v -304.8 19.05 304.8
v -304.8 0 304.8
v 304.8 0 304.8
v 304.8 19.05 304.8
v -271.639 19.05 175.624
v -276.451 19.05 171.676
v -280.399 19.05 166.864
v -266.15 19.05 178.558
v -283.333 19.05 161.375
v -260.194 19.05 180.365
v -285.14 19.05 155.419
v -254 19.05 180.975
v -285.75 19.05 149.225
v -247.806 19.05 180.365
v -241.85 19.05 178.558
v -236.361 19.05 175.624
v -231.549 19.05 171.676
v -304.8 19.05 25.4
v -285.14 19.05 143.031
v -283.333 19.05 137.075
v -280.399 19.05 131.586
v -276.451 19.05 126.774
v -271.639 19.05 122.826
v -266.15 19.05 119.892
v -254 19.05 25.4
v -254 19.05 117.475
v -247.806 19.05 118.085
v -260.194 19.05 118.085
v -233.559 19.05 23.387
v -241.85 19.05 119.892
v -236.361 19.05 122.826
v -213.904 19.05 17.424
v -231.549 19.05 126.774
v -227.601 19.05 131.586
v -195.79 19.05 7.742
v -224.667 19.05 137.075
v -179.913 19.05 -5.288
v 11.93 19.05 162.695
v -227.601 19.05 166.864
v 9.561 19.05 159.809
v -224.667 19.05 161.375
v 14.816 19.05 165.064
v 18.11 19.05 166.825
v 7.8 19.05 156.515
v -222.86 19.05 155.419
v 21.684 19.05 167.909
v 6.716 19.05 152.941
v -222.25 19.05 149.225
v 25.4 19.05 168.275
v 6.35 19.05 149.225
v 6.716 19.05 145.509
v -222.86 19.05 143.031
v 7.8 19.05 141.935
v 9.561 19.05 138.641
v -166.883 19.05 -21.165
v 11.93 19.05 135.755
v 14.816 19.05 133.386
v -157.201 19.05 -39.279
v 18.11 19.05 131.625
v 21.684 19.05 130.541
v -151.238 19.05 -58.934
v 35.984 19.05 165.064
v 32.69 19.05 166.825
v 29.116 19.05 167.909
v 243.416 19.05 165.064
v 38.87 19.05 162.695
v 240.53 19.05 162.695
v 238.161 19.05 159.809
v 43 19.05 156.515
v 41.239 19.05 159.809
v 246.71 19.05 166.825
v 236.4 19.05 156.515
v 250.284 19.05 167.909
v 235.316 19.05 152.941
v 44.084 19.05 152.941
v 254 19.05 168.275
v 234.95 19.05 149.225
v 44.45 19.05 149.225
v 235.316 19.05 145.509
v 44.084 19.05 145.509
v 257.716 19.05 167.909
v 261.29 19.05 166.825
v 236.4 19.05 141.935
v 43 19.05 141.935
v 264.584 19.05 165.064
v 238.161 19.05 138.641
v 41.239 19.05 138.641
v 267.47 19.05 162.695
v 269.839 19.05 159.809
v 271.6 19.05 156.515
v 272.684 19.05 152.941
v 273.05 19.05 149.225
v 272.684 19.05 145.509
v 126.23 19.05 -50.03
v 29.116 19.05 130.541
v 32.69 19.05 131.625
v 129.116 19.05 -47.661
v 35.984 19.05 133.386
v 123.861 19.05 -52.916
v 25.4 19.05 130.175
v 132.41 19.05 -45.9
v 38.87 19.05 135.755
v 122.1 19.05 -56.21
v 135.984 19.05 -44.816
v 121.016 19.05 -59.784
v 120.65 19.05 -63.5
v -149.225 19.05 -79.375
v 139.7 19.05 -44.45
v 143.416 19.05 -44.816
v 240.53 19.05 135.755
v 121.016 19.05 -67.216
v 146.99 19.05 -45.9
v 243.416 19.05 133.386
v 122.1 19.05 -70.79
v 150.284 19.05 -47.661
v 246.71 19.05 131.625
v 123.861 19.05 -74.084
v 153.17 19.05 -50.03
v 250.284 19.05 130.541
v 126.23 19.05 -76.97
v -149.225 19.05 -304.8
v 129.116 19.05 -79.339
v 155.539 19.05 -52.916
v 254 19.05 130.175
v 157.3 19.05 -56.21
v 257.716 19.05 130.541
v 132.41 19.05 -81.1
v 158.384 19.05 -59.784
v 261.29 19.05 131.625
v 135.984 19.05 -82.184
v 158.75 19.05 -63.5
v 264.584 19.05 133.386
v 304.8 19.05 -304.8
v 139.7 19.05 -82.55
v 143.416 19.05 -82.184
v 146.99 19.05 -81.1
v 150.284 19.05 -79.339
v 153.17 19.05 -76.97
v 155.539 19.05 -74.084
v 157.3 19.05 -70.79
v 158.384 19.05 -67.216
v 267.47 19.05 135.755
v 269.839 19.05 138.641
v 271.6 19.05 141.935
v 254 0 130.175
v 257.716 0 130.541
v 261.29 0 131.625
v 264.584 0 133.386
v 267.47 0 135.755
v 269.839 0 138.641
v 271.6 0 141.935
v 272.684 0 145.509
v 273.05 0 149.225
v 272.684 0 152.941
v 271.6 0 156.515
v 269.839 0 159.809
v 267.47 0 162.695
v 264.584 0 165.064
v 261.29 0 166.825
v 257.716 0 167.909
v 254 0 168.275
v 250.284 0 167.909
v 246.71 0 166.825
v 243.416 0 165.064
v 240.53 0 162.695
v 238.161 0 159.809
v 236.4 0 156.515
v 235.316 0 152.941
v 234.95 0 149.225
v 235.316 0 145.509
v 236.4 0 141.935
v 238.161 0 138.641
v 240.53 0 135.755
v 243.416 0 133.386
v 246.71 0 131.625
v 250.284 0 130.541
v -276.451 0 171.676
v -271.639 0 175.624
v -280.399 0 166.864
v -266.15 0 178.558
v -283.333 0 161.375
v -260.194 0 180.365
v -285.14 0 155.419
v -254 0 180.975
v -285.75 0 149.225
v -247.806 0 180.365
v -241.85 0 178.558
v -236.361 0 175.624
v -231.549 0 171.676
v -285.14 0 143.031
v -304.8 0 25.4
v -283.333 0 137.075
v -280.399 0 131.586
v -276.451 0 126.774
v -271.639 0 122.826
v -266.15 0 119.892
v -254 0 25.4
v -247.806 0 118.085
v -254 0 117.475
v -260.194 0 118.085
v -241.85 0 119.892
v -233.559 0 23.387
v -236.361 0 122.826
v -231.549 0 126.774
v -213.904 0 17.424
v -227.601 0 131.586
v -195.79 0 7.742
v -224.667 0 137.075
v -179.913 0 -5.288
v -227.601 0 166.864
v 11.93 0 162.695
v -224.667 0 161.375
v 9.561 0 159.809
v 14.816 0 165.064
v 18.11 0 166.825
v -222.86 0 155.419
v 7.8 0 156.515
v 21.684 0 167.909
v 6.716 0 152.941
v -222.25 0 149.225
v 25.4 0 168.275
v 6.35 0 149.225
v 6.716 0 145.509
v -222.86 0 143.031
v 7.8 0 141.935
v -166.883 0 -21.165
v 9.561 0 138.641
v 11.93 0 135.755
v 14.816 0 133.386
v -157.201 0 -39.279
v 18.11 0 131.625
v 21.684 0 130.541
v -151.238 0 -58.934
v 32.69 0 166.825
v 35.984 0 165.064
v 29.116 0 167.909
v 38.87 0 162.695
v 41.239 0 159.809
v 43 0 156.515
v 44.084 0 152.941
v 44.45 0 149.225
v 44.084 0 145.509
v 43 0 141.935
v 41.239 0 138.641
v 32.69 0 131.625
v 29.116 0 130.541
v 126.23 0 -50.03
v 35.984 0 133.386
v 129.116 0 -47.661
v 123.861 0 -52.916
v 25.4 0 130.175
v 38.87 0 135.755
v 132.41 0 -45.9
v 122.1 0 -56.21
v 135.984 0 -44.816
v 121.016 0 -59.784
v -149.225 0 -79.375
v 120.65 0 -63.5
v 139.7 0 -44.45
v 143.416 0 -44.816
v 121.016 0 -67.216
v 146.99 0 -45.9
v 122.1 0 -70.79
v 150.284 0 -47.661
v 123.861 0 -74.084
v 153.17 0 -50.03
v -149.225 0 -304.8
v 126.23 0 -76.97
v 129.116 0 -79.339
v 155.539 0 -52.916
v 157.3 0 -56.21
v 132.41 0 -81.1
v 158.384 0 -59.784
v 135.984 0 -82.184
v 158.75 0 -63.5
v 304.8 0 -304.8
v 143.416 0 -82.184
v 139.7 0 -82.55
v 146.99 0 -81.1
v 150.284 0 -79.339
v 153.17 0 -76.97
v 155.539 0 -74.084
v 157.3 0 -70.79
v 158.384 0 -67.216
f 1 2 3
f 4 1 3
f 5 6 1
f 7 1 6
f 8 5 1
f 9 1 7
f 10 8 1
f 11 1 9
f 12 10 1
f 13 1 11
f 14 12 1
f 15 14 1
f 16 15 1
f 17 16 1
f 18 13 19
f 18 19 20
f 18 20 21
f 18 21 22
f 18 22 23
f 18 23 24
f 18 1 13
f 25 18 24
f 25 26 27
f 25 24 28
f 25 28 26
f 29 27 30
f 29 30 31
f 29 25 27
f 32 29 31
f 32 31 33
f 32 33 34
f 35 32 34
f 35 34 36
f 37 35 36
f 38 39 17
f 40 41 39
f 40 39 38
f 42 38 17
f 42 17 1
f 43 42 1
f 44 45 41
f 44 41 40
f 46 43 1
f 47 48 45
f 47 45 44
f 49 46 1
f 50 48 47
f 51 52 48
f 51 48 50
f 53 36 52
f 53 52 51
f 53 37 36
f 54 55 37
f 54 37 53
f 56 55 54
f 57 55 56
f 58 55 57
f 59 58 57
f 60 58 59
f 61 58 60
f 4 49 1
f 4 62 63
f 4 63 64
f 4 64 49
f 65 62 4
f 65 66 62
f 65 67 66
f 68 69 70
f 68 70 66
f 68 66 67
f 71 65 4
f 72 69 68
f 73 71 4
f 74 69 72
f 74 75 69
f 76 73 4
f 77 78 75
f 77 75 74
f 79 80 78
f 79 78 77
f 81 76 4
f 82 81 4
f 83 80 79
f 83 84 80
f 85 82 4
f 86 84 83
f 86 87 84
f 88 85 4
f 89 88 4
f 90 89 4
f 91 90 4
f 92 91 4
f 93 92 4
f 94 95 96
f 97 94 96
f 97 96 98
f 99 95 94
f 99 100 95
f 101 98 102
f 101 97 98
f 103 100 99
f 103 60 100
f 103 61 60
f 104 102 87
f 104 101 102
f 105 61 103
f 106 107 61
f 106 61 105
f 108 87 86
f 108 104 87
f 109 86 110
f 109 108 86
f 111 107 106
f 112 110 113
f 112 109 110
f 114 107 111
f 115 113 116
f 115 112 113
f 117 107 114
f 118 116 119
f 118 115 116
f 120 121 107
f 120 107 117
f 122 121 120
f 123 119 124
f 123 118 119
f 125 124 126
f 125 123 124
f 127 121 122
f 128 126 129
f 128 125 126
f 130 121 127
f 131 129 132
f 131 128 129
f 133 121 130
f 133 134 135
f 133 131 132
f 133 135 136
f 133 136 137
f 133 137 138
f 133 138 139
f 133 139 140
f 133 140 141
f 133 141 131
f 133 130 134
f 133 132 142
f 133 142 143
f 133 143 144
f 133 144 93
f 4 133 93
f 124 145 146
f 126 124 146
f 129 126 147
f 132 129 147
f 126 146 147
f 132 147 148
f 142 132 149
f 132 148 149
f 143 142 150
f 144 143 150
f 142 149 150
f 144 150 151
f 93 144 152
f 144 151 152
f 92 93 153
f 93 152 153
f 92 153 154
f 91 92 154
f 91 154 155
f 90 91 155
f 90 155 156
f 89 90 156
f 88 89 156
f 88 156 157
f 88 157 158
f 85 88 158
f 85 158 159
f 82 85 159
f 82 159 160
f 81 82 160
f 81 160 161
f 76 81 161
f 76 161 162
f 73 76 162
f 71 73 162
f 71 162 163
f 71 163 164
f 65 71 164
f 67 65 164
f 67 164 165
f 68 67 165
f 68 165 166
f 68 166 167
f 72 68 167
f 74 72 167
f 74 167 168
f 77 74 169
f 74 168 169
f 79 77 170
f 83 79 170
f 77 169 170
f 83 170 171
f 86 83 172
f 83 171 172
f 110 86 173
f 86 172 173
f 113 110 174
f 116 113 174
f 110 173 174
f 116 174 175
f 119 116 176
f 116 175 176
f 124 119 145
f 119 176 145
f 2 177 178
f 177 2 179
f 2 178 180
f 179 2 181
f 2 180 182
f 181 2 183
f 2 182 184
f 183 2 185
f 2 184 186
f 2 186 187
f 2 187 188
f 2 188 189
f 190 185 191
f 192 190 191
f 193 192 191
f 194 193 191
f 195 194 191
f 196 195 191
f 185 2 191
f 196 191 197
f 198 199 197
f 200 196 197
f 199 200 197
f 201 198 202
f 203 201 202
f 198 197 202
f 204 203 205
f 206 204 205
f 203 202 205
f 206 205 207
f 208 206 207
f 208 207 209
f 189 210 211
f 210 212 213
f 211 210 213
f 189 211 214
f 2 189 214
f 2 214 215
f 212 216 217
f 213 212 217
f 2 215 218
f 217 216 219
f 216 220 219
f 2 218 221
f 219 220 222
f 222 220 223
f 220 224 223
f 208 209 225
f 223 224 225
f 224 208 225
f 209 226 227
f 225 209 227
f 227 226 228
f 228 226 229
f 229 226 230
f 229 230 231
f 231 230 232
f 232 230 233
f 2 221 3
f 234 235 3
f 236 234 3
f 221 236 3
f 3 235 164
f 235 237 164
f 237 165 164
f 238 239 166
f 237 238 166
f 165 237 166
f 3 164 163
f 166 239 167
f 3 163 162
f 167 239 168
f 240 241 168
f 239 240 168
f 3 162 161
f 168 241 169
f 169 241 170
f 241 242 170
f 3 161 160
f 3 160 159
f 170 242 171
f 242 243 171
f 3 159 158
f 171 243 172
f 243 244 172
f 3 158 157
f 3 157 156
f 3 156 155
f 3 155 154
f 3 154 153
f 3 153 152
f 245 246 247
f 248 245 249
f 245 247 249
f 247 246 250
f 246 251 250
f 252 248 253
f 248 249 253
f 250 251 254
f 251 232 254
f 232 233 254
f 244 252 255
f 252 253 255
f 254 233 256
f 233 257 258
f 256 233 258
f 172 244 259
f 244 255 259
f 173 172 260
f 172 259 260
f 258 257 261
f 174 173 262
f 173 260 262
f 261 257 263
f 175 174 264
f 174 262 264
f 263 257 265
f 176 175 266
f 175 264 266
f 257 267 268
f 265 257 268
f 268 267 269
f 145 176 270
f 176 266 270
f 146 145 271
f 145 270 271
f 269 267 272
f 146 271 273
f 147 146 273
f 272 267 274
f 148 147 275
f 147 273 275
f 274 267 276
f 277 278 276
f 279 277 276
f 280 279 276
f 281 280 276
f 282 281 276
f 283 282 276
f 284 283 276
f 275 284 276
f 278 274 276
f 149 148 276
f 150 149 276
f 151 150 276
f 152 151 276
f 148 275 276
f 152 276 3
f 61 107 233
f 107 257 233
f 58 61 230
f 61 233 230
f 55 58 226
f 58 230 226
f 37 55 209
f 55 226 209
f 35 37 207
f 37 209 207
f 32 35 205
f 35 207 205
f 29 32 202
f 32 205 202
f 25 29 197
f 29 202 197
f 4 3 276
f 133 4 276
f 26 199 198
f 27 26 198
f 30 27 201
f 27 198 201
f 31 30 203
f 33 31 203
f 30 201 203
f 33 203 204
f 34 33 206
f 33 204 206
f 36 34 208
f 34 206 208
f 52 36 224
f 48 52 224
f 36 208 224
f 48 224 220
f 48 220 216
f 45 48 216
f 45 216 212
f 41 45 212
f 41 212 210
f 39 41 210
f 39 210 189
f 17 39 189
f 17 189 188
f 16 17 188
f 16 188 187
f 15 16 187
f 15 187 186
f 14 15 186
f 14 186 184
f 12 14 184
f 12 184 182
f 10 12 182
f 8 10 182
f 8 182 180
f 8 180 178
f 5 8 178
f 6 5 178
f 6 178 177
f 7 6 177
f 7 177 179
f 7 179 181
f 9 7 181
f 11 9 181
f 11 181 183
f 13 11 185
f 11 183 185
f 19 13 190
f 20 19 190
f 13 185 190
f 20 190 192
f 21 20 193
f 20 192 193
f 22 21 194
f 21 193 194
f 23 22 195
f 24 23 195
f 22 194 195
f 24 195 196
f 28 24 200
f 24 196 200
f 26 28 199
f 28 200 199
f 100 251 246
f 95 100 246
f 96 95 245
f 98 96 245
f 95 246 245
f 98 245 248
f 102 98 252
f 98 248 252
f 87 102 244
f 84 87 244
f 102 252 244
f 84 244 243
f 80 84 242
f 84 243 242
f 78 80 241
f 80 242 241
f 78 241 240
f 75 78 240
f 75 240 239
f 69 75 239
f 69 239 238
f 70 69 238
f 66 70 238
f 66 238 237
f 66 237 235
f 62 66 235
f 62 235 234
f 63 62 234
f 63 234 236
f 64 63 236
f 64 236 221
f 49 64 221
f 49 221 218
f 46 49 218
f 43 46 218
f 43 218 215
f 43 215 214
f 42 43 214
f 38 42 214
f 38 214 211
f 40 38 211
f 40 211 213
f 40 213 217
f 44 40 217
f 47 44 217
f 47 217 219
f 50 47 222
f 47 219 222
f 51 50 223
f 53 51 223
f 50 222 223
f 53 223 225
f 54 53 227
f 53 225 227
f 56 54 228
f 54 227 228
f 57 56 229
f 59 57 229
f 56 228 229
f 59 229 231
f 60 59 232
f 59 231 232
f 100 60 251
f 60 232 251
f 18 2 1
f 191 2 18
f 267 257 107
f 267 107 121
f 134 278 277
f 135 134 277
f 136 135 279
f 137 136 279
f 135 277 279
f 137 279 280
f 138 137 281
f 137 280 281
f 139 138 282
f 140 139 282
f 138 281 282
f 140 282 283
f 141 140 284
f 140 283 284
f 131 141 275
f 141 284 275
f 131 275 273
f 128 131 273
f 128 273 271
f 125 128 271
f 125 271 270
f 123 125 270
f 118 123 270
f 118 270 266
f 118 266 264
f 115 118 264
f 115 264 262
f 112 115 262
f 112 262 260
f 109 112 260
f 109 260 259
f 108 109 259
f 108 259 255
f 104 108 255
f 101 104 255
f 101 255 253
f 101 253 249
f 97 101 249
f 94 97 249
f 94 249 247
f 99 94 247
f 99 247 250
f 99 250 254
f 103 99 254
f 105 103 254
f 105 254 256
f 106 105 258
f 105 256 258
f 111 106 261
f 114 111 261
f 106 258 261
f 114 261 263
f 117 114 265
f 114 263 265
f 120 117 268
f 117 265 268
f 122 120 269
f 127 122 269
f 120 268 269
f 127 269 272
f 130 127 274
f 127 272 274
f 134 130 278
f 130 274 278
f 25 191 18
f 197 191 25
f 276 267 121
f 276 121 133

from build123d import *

# Parameters (mm, degrees)
SKETCH1_W           = 609.6
SKETCH1_H           = 609.6
BOSS_EXTRUDE1_DEPTH = 19.05
SKETCH2_R           = 31.75
CUT_EXTRUDE1_DEPTH  = 432.473037976
SKETCH9_R           = 104.775
CUT_EXTRUDE8_DEPTH  = 432.473037976
CUT_EXTRUDE9_DEPTH  = 432.473037976
SKETCH11_W          = 123.071998818
SKETCH11_H          = 104.775
CUT_EXTRUDE10_DEPTH = 432.473037976
SKETCH12_R          = 19.05
CUT_EXTRUDE11_DEPTH = 432.473037976
SKETCH13_R          = 19.05
CUT_EXTRUDE12_DEPTH = 432.473037976


with BuildPart() as part:
    # Sketch1 → Boss-Extrude1 (new body)
    with BuildSketch(Plane(origin=(0, 0, 0), x_dir=(1, 0, 0), z_dir=(0, 1, 0))):
        Rectangle(SKETCH1_W, SKETCH1_H)
    extrude(amount=BOSS_EXTRUDE1_DEPTH)

    # Sketch2 → Cut-Extrude1 (cut, through all)
    with BuildSketch(Plane.XZ):
        with Locations(Location((-254, 149.225, 0), (0, 0, 270))):
            Circle(SKETCH2_R)
    extrude(amount=-CUT_EXTRUDE1_DEPTH, mode=Mode.SUBTRACT)

    # Sketch9 → Cut-Extrude8 (cut, through all)
    with BuildSketch(Plane.XZ):
        with Locations((-254, -79.375)):
            Circle(SKETCH9_R)
    extrude(amount=-CUT_EXTRUDE8_DEPTH, mode=Mode.SUBTRACT)

    # Sketch10 → Cut-Extrude9 (cut, through all)
    with BuildSketch(Plane.XZ):
        Polygon((-254, -79.375), (-149.225, -79.375), (-149.225, -304.8), (-304.8, -304.8), (-304.8, -79.375), align=None)
    extrude(amount=-CUT_EXTRUDE9_DEPTH, mode=Mode.SUBTRACT)

    # Sketch11 → Cut-Extrude10 (cut, through all)
    with BuildSketch(Plane.XZ):
        with Locations((-315.535999409, -26.9875)):
            Rectangle(SKETCH11_W, SKETCH11_H)
    extrude(amount=-CUT_EXTRUDE10_DEPTH, mode=Mode.SUBTRACT)

    # Sketch12 → Cut-Extrude11 (cut, through all)
    with BuildSketch(Plane.XZ):
        with Locations(Location((25.4, 149.225, 0), (0, 0, 270))):
            Circle(SKETCH12_R)
        with Locations(Location((254, 149.225, 0), (0, 0, 270))):
            Circle(SKETCH12_R)
    extrude(amount=-CUT_EXTRUDE11_DEPTH, mode=Mode.SUBTRACT)

    # Sketch13 → Cut-Extrude12 (cut, through all)
    with BuildSketch(Plane.XZ):
        with Locations(Location((139.7, -63.5, 0), (0, 0, 270))):
            Circle(SKETCH13_R)
    extrude(amount=-CUT_EXTRUDE12_DEPTH, mode=Mode.SUBTRACT)


solid = part.part
